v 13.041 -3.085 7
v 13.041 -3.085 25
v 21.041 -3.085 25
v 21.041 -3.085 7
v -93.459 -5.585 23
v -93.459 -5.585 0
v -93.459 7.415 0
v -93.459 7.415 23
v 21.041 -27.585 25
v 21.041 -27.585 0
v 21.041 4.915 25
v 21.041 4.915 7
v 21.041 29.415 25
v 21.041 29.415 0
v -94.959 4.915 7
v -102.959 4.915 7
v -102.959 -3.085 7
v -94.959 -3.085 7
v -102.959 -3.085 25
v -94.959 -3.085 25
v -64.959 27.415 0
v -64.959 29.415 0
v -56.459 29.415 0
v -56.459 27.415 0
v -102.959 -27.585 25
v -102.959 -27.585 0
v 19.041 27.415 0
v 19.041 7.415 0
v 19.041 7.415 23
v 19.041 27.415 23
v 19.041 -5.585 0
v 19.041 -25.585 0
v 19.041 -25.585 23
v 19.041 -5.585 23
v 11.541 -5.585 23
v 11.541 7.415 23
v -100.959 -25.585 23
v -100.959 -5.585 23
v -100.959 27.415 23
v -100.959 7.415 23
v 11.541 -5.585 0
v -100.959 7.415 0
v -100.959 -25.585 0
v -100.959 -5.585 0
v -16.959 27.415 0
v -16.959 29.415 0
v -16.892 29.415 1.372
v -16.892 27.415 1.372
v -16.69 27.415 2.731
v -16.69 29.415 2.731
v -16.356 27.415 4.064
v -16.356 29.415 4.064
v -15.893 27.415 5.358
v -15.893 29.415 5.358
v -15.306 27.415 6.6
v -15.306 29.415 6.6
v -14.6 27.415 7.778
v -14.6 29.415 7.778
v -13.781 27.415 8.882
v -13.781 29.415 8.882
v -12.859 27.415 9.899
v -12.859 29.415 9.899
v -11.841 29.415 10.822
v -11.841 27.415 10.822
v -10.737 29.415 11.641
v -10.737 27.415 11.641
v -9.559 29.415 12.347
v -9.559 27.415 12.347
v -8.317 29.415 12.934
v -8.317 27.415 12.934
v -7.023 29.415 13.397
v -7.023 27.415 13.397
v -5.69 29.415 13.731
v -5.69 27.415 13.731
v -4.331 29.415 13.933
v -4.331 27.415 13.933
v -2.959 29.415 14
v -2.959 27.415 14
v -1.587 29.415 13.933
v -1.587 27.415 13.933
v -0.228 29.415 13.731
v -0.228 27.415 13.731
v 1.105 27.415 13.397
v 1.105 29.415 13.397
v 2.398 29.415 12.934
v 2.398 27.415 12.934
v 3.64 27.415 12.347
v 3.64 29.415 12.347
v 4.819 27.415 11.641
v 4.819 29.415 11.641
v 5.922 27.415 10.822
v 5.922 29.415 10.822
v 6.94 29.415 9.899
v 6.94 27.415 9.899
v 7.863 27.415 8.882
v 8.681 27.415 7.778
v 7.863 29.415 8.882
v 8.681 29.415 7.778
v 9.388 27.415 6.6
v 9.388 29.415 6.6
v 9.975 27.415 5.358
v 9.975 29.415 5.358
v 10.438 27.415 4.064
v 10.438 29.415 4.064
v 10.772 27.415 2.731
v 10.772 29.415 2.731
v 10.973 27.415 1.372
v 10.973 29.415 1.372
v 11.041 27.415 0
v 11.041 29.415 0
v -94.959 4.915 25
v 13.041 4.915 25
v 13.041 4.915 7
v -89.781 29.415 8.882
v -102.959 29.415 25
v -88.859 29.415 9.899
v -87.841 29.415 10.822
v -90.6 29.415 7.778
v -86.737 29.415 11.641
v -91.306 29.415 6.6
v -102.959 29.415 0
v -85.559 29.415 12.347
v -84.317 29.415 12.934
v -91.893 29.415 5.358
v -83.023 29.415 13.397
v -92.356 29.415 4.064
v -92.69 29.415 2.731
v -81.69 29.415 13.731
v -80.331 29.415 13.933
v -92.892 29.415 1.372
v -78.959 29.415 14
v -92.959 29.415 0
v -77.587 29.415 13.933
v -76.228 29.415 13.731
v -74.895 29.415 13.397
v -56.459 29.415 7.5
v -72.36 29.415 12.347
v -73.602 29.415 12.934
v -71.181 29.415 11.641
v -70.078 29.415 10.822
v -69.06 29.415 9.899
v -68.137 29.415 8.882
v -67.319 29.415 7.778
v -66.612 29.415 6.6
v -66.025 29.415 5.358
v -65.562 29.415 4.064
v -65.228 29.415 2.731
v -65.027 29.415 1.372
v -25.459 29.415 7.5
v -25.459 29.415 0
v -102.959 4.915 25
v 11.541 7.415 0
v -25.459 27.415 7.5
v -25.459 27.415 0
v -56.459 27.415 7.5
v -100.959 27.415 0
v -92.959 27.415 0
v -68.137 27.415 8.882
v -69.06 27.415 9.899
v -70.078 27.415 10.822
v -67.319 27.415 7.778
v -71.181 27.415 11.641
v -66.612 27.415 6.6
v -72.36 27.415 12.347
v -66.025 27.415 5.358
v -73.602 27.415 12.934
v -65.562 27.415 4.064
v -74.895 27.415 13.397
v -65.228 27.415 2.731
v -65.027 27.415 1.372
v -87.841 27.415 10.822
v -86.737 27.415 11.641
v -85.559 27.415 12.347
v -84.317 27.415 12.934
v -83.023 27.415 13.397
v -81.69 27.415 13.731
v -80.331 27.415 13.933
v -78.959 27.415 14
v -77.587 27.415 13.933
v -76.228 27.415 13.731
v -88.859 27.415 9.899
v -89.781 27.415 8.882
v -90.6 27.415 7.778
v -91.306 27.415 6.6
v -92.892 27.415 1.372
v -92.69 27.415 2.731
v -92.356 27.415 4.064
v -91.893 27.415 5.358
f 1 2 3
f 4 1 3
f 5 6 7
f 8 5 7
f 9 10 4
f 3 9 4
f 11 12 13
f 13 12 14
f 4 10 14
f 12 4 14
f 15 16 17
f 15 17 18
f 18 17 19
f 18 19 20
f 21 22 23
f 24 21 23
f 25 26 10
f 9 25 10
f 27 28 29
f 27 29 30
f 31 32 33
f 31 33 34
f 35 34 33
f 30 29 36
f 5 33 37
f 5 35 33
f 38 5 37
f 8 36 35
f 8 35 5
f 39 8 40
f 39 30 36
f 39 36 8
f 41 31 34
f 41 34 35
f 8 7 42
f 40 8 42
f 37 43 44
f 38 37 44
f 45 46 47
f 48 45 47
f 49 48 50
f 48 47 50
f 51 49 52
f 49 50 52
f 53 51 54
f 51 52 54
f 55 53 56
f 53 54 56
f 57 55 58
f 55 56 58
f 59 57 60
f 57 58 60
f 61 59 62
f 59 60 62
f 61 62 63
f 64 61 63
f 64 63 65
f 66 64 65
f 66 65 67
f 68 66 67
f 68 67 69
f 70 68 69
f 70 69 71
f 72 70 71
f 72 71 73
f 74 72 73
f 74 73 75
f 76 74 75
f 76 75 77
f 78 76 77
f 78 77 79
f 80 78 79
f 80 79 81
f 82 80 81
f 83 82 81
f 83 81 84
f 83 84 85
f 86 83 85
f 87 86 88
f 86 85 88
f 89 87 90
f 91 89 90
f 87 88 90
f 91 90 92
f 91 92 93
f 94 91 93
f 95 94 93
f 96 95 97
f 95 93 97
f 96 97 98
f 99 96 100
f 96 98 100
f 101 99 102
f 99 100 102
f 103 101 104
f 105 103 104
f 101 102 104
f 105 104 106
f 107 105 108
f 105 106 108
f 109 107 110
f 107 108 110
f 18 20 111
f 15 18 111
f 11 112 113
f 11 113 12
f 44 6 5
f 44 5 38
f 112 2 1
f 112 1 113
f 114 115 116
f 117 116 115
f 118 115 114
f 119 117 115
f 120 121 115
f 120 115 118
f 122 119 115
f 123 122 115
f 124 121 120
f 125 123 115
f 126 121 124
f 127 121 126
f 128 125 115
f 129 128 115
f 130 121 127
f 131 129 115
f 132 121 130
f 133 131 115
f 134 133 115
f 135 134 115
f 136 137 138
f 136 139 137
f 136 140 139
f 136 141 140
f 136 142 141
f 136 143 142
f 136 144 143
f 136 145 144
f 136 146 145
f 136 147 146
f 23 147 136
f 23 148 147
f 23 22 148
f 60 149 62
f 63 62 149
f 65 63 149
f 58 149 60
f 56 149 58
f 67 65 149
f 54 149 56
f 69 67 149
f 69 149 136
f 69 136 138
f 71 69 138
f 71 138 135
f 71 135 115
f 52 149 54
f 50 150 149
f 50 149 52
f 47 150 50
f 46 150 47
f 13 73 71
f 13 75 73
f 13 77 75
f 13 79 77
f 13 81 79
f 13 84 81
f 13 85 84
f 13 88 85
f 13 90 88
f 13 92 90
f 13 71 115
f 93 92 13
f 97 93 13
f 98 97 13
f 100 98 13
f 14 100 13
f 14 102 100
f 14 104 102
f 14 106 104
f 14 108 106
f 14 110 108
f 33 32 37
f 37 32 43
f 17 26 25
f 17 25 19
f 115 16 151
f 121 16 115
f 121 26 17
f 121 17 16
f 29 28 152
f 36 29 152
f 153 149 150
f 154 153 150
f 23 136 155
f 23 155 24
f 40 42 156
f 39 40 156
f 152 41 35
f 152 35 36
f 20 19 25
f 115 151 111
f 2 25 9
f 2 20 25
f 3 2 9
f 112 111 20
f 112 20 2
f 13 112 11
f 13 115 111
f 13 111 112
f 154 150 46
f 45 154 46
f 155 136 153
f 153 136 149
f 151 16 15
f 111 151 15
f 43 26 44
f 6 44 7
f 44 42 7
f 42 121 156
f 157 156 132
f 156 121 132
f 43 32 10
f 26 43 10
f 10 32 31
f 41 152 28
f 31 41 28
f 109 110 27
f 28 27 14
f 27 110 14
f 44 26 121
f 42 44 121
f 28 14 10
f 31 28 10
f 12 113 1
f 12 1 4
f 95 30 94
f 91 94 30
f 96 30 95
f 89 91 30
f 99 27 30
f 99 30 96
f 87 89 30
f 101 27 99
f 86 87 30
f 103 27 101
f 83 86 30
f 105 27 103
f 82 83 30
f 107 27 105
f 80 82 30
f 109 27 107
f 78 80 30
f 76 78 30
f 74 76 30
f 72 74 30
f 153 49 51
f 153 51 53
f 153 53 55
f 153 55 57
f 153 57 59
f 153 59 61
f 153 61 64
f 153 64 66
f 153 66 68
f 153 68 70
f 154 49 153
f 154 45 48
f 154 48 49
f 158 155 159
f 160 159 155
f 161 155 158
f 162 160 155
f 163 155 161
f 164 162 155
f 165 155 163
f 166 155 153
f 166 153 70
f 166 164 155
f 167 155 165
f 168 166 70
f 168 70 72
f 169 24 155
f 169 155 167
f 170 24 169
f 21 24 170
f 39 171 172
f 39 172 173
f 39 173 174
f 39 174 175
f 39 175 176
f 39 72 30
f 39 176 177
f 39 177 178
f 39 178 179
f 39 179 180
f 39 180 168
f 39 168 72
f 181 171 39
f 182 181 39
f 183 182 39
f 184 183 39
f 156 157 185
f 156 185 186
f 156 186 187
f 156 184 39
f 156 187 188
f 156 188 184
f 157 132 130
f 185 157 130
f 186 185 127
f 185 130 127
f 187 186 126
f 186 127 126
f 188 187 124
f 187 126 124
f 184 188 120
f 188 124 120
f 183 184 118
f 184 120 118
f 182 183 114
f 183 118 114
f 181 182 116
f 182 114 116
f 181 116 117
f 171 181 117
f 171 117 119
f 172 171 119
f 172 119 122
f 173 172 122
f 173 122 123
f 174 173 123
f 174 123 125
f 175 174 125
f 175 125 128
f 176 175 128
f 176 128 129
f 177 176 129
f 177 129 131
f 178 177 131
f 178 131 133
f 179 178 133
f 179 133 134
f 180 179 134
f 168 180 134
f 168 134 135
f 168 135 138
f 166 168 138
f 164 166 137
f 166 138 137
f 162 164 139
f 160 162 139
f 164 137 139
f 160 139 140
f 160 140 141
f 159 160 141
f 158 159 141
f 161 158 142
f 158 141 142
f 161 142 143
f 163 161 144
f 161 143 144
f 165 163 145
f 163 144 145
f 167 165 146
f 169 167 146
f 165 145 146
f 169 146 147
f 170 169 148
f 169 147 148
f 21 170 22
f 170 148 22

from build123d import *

# Parameters (mm, degrees)
SKIZZE1_W                       = 124
SKIZZE1_H                       = 57
AUFSATZ_LINEAR_AUSTRAGEN1_DEPTH = 25
SKIZZE2_W                       = 8
SKIZZE2_H                       = 8
SCHNITT_LINEAR_AUSTRAGEN4_DEPTH = 18
SKIZZE5_W                       = 120
SKIZZE5_H                       = 20
SKIZZE5_W_2                     = 105
SKIZZE5_H_2                     = 13
SCHNITT_LINEAR_AUSTRAGEN5_DEPTH = 23
SKIZZE6_R                       = 14
SKIZZE6_W                       = 31
SKIZZE6_H                       = 7.5
SCHNITT_LINEAR_AUSTRAGEN6_DEPTH = 2


with BuildPart() as part:
    # Skizze1 → Aufsatz-Linear austragen1 (new body)
    with BuildSketch(Plane.XY):
        with Locations((-40.959148289, 0.914772727)):
            Rectangle(SKIZZE1_W, SKIZZE1_H)
    extrude(amount=AUFSATZ_LINEAR_AUSTRAGEN1_DEPTH)

    # Skizze2 → Schnitt-Linear austragen4 (cut)
    with BuildSketch(Plane.XY.offset(25)):
        with Locations((17.040851711, 0.914772727)):
            Rectangle(SKIZZE2_W, SKIZZE2_H)
        with Locations((-98.959148289, 0.914772727)):
            Rectangle(SKIZZE2_W, SKIZZE2_H)
    extrude(amount=-SCHNITT_LINEAR_AUSTRAGEN4_DEPTH, mode=Mode.SUBTRACT)

    # Skizze5 → Schnitt-Linear austragen5 (cut)
    with BuildSketch(Plane(origin=(0, 0, 0), x_dir=(-1, 0, 0), z_dir=(0, 0, -1))):
        with Locations((40.959148289, 17.414772727)):
            Rectangle(SKIZZE5_W, SKIZZE5_H)
        with Locations((40.959148289, 0.914772727)):
            Rectangle(SKIZZE5_W_2, SKIZZE5_H_2)
        with Locations((40.959148289, -15.585227273)):
            Rectangle(SKIZZE5_W, SKIZZE5_H)
    extrude(amount=-SCHNITT_LINEAR_AUSTRAGEN5_DEPTH, mode=Mode.SUBTRACT)

    # Skizze6 → Schnitt-Linear austragen6 (cut)
    with BuildSketch(Plane(origin=(0, 29.414772727, 0), x_dir=(1, 0, 0), z_dir=(0, 1, 0))):
        with Locations((-2.959148289, 0)):
            Circle(SKIZZE6_R)
        with Locations((-78.959148289, 0)):
            Circle(SKIZZE6_R)
        with Locations((-40.959148289, -3.75)):
            Rectangle(SKIZZE6_W, SKIZZE6_H)
    extrude(amount=-SCHNITT_LINEAR_AUSTRAGEN6_DEPTH, mode=Mode.SUBTRACT)


solid = part.part
